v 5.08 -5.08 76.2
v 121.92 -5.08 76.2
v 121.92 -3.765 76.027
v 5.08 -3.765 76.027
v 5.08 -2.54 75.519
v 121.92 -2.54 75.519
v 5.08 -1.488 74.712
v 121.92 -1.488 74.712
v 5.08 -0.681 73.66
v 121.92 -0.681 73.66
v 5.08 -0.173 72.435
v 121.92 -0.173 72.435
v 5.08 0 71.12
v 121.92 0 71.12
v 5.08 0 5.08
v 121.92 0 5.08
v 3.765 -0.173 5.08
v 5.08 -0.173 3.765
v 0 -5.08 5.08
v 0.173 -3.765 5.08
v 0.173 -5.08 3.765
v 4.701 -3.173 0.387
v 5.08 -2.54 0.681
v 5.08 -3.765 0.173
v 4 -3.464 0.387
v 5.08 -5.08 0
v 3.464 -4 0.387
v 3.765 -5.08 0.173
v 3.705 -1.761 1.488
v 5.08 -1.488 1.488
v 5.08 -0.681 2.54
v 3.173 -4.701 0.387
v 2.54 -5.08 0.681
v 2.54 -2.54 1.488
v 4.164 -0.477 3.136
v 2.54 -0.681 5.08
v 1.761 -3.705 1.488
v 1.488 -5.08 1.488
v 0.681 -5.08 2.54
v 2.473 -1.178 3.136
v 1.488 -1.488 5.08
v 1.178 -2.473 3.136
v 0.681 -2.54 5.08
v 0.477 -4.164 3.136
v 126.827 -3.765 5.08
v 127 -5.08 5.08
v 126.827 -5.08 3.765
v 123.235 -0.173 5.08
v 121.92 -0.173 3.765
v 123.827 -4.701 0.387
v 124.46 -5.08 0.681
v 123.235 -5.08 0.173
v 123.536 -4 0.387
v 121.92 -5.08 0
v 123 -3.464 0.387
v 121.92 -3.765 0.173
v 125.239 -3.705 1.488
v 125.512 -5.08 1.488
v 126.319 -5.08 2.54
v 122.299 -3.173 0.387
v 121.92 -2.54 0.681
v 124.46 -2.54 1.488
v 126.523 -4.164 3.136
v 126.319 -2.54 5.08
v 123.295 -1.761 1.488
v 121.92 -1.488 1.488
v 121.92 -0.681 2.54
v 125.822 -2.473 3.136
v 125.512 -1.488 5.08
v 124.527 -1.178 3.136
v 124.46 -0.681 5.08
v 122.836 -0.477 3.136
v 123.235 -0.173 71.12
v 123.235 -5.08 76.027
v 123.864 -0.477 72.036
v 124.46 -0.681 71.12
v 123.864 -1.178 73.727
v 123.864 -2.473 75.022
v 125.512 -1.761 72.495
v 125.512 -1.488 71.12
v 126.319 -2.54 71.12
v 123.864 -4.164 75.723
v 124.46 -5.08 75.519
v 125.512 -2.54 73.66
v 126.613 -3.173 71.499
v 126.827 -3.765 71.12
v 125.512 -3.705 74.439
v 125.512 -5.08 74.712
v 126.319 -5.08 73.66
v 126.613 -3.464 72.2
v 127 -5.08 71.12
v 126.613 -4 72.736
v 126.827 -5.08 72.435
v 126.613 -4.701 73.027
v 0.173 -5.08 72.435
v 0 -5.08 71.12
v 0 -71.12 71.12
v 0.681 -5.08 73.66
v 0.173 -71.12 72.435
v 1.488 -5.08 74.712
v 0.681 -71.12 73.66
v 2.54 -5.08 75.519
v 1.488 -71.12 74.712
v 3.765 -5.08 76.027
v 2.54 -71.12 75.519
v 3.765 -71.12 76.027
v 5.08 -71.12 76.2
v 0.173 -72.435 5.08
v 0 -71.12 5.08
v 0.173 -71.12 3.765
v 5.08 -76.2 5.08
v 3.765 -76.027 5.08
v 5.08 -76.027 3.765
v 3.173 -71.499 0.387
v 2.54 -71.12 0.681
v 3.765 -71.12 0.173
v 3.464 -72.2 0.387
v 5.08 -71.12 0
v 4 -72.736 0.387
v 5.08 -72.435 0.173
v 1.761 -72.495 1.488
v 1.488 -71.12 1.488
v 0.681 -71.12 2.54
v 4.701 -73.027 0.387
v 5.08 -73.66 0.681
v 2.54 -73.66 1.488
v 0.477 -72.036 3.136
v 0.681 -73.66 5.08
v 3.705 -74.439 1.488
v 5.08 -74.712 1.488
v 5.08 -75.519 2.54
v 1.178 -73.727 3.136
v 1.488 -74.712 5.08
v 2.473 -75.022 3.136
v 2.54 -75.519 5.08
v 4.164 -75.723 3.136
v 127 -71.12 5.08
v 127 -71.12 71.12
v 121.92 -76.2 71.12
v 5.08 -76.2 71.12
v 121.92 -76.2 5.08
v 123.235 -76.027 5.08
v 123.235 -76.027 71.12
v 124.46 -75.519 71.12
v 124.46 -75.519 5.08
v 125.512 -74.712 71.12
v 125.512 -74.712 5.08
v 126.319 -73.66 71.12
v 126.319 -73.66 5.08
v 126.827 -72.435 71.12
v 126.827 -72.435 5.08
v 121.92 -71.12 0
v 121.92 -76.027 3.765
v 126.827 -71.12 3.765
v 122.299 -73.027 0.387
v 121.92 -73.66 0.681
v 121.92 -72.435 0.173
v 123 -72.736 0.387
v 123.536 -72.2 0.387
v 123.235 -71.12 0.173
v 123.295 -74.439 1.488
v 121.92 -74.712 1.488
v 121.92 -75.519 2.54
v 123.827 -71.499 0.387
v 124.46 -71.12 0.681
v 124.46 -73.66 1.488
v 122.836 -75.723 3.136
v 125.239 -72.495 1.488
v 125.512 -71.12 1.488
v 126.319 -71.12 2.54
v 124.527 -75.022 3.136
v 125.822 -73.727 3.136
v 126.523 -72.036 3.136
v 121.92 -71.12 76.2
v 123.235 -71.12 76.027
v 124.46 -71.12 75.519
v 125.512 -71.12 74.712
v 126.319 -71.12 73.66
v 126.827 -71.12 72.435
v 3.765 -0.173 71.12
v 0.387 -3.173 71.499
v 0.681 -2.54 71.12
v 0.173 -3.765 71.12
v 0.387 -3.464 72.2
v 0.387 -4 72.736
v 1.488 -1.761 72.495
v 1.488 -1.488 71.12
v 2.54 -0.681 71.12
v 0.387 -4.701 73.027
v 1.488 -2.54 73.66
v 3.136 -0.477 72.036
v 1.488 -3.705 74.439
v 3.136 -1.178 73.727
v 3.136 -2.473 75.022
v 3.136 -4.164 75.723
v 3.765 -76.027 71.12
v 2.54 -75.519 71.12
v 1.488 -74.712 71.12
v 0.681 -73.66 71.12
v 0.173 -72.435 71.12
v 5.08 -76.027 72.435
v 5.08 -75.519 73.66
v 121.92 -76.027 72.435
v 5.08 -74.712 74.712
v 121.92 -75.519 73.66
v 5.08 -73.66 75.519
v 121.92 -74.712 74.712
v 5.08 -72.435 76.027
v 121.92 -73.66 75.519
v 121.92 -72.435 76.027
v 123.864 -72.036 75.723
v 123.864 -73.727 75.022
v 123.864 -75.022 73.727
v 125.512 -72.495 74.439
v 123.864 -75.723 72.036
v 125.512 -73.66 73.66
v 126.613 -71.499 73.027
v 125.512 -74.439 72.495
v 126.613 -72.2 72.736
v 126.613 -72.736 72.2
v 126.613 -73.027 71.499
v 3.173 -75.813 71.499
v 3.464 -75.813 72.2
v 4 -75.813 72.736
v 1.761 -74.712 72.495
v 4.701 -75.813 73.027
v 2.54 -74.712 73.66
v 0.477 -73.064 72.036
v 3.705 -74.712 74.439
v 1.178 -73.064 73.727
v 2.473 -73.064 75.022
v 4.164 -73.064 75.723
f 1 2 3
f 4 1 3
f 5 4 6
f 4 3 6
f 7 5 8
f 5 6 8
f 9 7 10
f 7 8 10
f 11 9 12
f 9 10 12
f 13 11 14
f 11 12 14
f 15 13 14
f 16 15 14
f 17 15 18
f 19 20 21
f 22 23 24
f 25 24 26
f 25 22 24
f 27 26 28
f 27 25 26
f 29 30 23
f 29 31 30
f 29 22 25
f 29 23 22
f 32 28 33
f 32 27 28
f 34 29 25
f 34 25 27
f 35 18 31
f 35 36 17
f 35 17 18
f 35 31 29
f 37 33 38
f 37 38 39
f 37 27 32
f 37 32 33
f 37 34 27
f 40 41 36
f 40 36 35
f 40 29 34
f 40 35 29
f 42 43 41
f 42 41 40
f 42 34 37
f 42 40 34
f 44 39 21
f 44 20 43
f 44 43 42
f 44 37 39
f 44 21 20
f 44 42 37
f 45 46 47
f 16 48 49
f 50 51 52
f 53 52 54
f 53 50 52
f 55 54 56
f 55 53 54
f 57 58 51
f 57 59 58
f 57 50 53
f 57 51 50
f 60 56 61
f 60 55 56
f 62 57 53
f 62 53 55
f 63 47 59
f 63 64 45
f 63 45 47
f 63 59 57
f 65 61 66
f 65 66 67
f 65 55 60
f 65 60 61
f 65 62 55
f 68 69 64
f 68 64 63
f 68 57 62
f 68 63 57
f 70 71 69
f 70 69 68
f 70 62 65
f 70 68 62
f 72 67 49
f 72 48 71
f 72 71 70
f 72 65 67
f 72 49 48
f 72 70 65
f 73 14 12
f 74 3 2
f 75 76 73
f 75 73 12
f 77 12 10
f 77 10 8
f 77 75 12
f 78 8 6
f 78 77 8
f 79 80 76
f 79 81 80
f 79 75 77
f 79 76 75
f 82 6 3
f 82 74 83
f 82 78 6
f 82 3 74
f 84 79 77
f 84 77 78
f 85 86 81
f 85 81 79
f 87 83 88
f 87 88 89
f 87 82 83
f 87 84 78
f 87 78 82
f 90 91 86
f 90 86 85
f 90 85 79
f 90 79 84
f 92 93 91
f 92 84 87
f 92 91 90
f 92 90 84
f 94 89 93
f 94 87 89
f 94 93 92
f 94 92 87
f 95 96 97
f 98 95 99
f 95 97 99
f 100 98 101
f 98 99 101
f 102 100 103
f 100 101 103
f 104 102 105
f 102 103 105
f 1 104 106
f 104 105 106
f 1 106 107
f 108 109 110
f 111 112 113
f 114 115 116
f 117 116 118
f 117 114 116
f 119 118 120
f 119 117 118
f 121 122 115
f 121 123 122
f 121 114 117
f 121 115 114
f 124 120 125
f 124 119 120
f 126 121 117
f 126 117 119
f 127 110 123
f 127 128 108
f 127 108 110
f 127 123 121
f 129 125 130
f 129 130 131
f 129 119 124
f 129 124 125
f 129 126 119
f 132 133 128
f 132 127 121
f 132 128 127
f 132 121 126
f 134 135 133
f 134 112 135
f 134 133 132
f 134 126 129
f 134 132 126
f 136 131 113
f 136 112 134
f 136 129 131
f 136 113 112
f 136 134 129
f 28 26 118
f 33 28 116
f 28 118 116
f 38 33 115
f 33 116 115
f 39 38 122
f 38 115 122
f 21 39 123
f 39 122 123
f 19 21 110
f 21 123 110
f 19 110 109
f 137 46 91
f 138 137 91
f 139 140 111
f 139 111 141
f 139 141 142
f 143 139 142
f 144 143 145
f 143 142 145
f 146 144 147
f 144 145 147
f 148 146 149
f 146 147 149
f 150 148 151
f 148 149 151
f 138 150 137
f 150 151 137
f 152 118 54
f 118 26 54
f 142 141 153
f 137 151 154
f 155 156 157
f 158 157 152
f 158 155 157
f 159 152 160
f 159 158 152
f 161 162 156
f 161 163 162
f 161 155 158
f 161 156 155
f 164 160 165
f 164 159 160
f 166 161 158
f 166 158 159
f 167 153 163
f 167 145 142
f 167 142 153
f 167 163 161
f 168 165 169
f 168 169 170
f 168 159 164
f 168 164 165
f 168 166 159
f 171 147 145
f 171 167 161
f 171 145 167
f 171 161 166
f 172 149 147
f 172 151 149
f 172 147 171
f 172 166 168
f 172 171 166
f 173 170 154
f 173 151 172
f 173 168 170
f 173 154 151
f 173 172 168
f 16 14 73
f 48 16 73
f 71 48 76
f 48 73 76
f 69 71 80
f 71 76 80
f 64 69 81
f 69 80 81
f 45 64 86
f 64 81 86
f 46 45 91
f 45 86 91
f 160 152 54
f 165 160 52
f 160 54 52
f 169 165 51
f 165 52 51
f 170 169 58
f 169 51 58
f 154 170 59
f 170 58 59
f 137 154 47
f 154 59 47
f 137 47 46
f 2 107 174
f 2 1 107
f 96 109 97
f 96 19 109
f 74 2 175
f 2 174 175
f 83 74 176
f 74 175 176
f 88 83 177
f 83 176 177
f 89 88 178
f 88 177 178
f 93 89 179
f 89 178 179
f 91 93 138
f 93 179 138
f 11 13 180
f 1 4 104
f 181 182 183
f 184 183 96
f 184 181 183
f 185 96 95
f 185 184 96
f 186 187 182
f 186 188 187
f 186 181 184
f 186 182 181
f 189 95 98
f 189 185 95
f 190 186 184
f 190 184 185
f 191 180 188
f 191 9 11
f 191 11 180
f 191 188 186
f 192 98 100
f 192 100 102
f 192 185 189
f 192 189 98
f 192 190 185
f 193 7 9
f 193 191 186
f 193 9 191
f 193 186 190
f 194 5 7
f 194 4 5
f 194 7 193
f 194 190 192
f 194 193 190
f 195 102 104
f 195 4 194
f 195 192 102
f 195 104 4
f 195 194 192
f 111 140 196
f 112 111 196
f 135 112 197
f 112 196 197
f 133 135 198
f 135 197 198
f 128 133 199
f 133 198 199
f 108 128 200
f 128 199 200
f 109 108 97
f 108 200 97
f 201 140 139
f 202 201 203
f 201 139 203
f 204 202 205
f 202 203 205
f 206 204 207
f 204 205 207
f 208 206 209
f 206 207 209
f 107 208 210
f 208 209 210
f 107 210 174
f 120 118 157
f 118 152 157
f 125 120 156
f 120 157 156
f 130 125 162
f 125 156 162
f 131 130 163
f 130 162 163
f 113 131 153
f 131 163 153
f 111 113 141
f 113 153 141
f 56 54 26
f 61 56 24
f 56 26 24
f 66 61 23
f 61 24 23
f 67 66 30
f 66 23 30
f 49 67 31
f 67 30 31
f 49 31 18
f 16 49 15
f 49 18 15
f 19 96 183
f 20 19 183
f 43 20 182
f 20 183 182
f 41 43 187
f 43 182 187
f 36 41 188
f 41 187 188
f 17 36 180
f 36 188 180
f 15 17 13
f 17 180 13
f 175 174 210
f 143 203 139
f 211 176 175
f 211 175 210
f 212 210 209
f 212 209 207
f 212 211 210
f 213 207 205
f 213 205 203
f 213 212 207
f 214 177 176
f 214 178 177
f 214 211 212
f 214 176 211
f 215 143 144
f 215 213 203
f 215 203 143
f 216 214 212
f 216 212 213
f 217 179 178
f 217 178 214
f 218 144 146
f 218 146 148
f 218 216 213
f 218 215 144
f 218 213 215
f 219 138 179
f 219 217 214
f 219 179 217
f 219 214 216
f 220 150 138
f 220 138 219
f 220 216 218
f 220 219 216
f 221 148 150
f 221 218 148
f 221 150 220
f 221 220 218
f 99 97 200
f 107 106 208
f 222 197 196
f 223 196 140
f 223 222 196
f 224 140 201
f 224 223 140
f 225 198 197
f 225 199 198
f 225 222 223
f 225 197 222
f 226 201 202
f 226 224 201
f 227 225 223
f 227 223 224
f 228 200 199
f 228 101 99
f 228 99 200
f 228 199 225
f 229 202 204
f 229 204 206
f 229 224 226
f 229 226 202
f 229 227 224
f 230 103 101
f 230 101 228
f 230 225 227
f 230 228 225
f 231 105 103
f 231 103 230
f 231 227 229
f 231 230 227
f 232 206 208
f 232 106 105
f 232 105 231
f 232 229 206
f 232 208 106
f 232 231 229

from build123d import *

# Parameters (mm, degrees)
F0_W     = 127
F0_H     = 76.2
F1_DEPTH = 76.2
F2_R     = 5.08
F3_R     = 5.08
F4_R     = 5.08
F5_R     = 5.08
F6_R     = 5.08


with BuildPart() as f1:
    # F0 (on Front) → F1 (new body)
    with BuildSketch(Plane.XZ):
        with Locations((63.5, 38.1)):
            Rectangle(F0_W, F0_H)
    extrude(amount=F1_DEPTH)

    # F2
    f2_edges = [f1.edges().sort_by_distance(p)[0] for p in [
        (63.5, 0, 76.2),
    ]]
    fillet(f2_edges, radius=F2_R)

    # F3
    f3_edges = [f1.edges().sort_by_distance(p)[0] for p in [
        (0, -40.64, 76.2),
    ]]
    fillet(f3_edges, radius=F3_R)

    # F4
    f4_edges = [f1.edges().sort_by_distance(p)[0] for p in [
        (66.04, -76.2, 76.2),
    ]]
    fillet(f4_edges, radius=F4_R)

    # F5
    f5_edges = [f1.edges().sort_by_distance(p)[0] for p in [
        (127, -38.1, 76.2),
    ]]
    fillet(f5_edges, radius=F5_R)

    # F6
    f6_edges = [f1.edges().sort_by_distance(p)[0] for p in [
        (63.5, -76.2, 0),
    ]]
    fillet(f6_edges, radius=F6_R)


solid = f1.part
